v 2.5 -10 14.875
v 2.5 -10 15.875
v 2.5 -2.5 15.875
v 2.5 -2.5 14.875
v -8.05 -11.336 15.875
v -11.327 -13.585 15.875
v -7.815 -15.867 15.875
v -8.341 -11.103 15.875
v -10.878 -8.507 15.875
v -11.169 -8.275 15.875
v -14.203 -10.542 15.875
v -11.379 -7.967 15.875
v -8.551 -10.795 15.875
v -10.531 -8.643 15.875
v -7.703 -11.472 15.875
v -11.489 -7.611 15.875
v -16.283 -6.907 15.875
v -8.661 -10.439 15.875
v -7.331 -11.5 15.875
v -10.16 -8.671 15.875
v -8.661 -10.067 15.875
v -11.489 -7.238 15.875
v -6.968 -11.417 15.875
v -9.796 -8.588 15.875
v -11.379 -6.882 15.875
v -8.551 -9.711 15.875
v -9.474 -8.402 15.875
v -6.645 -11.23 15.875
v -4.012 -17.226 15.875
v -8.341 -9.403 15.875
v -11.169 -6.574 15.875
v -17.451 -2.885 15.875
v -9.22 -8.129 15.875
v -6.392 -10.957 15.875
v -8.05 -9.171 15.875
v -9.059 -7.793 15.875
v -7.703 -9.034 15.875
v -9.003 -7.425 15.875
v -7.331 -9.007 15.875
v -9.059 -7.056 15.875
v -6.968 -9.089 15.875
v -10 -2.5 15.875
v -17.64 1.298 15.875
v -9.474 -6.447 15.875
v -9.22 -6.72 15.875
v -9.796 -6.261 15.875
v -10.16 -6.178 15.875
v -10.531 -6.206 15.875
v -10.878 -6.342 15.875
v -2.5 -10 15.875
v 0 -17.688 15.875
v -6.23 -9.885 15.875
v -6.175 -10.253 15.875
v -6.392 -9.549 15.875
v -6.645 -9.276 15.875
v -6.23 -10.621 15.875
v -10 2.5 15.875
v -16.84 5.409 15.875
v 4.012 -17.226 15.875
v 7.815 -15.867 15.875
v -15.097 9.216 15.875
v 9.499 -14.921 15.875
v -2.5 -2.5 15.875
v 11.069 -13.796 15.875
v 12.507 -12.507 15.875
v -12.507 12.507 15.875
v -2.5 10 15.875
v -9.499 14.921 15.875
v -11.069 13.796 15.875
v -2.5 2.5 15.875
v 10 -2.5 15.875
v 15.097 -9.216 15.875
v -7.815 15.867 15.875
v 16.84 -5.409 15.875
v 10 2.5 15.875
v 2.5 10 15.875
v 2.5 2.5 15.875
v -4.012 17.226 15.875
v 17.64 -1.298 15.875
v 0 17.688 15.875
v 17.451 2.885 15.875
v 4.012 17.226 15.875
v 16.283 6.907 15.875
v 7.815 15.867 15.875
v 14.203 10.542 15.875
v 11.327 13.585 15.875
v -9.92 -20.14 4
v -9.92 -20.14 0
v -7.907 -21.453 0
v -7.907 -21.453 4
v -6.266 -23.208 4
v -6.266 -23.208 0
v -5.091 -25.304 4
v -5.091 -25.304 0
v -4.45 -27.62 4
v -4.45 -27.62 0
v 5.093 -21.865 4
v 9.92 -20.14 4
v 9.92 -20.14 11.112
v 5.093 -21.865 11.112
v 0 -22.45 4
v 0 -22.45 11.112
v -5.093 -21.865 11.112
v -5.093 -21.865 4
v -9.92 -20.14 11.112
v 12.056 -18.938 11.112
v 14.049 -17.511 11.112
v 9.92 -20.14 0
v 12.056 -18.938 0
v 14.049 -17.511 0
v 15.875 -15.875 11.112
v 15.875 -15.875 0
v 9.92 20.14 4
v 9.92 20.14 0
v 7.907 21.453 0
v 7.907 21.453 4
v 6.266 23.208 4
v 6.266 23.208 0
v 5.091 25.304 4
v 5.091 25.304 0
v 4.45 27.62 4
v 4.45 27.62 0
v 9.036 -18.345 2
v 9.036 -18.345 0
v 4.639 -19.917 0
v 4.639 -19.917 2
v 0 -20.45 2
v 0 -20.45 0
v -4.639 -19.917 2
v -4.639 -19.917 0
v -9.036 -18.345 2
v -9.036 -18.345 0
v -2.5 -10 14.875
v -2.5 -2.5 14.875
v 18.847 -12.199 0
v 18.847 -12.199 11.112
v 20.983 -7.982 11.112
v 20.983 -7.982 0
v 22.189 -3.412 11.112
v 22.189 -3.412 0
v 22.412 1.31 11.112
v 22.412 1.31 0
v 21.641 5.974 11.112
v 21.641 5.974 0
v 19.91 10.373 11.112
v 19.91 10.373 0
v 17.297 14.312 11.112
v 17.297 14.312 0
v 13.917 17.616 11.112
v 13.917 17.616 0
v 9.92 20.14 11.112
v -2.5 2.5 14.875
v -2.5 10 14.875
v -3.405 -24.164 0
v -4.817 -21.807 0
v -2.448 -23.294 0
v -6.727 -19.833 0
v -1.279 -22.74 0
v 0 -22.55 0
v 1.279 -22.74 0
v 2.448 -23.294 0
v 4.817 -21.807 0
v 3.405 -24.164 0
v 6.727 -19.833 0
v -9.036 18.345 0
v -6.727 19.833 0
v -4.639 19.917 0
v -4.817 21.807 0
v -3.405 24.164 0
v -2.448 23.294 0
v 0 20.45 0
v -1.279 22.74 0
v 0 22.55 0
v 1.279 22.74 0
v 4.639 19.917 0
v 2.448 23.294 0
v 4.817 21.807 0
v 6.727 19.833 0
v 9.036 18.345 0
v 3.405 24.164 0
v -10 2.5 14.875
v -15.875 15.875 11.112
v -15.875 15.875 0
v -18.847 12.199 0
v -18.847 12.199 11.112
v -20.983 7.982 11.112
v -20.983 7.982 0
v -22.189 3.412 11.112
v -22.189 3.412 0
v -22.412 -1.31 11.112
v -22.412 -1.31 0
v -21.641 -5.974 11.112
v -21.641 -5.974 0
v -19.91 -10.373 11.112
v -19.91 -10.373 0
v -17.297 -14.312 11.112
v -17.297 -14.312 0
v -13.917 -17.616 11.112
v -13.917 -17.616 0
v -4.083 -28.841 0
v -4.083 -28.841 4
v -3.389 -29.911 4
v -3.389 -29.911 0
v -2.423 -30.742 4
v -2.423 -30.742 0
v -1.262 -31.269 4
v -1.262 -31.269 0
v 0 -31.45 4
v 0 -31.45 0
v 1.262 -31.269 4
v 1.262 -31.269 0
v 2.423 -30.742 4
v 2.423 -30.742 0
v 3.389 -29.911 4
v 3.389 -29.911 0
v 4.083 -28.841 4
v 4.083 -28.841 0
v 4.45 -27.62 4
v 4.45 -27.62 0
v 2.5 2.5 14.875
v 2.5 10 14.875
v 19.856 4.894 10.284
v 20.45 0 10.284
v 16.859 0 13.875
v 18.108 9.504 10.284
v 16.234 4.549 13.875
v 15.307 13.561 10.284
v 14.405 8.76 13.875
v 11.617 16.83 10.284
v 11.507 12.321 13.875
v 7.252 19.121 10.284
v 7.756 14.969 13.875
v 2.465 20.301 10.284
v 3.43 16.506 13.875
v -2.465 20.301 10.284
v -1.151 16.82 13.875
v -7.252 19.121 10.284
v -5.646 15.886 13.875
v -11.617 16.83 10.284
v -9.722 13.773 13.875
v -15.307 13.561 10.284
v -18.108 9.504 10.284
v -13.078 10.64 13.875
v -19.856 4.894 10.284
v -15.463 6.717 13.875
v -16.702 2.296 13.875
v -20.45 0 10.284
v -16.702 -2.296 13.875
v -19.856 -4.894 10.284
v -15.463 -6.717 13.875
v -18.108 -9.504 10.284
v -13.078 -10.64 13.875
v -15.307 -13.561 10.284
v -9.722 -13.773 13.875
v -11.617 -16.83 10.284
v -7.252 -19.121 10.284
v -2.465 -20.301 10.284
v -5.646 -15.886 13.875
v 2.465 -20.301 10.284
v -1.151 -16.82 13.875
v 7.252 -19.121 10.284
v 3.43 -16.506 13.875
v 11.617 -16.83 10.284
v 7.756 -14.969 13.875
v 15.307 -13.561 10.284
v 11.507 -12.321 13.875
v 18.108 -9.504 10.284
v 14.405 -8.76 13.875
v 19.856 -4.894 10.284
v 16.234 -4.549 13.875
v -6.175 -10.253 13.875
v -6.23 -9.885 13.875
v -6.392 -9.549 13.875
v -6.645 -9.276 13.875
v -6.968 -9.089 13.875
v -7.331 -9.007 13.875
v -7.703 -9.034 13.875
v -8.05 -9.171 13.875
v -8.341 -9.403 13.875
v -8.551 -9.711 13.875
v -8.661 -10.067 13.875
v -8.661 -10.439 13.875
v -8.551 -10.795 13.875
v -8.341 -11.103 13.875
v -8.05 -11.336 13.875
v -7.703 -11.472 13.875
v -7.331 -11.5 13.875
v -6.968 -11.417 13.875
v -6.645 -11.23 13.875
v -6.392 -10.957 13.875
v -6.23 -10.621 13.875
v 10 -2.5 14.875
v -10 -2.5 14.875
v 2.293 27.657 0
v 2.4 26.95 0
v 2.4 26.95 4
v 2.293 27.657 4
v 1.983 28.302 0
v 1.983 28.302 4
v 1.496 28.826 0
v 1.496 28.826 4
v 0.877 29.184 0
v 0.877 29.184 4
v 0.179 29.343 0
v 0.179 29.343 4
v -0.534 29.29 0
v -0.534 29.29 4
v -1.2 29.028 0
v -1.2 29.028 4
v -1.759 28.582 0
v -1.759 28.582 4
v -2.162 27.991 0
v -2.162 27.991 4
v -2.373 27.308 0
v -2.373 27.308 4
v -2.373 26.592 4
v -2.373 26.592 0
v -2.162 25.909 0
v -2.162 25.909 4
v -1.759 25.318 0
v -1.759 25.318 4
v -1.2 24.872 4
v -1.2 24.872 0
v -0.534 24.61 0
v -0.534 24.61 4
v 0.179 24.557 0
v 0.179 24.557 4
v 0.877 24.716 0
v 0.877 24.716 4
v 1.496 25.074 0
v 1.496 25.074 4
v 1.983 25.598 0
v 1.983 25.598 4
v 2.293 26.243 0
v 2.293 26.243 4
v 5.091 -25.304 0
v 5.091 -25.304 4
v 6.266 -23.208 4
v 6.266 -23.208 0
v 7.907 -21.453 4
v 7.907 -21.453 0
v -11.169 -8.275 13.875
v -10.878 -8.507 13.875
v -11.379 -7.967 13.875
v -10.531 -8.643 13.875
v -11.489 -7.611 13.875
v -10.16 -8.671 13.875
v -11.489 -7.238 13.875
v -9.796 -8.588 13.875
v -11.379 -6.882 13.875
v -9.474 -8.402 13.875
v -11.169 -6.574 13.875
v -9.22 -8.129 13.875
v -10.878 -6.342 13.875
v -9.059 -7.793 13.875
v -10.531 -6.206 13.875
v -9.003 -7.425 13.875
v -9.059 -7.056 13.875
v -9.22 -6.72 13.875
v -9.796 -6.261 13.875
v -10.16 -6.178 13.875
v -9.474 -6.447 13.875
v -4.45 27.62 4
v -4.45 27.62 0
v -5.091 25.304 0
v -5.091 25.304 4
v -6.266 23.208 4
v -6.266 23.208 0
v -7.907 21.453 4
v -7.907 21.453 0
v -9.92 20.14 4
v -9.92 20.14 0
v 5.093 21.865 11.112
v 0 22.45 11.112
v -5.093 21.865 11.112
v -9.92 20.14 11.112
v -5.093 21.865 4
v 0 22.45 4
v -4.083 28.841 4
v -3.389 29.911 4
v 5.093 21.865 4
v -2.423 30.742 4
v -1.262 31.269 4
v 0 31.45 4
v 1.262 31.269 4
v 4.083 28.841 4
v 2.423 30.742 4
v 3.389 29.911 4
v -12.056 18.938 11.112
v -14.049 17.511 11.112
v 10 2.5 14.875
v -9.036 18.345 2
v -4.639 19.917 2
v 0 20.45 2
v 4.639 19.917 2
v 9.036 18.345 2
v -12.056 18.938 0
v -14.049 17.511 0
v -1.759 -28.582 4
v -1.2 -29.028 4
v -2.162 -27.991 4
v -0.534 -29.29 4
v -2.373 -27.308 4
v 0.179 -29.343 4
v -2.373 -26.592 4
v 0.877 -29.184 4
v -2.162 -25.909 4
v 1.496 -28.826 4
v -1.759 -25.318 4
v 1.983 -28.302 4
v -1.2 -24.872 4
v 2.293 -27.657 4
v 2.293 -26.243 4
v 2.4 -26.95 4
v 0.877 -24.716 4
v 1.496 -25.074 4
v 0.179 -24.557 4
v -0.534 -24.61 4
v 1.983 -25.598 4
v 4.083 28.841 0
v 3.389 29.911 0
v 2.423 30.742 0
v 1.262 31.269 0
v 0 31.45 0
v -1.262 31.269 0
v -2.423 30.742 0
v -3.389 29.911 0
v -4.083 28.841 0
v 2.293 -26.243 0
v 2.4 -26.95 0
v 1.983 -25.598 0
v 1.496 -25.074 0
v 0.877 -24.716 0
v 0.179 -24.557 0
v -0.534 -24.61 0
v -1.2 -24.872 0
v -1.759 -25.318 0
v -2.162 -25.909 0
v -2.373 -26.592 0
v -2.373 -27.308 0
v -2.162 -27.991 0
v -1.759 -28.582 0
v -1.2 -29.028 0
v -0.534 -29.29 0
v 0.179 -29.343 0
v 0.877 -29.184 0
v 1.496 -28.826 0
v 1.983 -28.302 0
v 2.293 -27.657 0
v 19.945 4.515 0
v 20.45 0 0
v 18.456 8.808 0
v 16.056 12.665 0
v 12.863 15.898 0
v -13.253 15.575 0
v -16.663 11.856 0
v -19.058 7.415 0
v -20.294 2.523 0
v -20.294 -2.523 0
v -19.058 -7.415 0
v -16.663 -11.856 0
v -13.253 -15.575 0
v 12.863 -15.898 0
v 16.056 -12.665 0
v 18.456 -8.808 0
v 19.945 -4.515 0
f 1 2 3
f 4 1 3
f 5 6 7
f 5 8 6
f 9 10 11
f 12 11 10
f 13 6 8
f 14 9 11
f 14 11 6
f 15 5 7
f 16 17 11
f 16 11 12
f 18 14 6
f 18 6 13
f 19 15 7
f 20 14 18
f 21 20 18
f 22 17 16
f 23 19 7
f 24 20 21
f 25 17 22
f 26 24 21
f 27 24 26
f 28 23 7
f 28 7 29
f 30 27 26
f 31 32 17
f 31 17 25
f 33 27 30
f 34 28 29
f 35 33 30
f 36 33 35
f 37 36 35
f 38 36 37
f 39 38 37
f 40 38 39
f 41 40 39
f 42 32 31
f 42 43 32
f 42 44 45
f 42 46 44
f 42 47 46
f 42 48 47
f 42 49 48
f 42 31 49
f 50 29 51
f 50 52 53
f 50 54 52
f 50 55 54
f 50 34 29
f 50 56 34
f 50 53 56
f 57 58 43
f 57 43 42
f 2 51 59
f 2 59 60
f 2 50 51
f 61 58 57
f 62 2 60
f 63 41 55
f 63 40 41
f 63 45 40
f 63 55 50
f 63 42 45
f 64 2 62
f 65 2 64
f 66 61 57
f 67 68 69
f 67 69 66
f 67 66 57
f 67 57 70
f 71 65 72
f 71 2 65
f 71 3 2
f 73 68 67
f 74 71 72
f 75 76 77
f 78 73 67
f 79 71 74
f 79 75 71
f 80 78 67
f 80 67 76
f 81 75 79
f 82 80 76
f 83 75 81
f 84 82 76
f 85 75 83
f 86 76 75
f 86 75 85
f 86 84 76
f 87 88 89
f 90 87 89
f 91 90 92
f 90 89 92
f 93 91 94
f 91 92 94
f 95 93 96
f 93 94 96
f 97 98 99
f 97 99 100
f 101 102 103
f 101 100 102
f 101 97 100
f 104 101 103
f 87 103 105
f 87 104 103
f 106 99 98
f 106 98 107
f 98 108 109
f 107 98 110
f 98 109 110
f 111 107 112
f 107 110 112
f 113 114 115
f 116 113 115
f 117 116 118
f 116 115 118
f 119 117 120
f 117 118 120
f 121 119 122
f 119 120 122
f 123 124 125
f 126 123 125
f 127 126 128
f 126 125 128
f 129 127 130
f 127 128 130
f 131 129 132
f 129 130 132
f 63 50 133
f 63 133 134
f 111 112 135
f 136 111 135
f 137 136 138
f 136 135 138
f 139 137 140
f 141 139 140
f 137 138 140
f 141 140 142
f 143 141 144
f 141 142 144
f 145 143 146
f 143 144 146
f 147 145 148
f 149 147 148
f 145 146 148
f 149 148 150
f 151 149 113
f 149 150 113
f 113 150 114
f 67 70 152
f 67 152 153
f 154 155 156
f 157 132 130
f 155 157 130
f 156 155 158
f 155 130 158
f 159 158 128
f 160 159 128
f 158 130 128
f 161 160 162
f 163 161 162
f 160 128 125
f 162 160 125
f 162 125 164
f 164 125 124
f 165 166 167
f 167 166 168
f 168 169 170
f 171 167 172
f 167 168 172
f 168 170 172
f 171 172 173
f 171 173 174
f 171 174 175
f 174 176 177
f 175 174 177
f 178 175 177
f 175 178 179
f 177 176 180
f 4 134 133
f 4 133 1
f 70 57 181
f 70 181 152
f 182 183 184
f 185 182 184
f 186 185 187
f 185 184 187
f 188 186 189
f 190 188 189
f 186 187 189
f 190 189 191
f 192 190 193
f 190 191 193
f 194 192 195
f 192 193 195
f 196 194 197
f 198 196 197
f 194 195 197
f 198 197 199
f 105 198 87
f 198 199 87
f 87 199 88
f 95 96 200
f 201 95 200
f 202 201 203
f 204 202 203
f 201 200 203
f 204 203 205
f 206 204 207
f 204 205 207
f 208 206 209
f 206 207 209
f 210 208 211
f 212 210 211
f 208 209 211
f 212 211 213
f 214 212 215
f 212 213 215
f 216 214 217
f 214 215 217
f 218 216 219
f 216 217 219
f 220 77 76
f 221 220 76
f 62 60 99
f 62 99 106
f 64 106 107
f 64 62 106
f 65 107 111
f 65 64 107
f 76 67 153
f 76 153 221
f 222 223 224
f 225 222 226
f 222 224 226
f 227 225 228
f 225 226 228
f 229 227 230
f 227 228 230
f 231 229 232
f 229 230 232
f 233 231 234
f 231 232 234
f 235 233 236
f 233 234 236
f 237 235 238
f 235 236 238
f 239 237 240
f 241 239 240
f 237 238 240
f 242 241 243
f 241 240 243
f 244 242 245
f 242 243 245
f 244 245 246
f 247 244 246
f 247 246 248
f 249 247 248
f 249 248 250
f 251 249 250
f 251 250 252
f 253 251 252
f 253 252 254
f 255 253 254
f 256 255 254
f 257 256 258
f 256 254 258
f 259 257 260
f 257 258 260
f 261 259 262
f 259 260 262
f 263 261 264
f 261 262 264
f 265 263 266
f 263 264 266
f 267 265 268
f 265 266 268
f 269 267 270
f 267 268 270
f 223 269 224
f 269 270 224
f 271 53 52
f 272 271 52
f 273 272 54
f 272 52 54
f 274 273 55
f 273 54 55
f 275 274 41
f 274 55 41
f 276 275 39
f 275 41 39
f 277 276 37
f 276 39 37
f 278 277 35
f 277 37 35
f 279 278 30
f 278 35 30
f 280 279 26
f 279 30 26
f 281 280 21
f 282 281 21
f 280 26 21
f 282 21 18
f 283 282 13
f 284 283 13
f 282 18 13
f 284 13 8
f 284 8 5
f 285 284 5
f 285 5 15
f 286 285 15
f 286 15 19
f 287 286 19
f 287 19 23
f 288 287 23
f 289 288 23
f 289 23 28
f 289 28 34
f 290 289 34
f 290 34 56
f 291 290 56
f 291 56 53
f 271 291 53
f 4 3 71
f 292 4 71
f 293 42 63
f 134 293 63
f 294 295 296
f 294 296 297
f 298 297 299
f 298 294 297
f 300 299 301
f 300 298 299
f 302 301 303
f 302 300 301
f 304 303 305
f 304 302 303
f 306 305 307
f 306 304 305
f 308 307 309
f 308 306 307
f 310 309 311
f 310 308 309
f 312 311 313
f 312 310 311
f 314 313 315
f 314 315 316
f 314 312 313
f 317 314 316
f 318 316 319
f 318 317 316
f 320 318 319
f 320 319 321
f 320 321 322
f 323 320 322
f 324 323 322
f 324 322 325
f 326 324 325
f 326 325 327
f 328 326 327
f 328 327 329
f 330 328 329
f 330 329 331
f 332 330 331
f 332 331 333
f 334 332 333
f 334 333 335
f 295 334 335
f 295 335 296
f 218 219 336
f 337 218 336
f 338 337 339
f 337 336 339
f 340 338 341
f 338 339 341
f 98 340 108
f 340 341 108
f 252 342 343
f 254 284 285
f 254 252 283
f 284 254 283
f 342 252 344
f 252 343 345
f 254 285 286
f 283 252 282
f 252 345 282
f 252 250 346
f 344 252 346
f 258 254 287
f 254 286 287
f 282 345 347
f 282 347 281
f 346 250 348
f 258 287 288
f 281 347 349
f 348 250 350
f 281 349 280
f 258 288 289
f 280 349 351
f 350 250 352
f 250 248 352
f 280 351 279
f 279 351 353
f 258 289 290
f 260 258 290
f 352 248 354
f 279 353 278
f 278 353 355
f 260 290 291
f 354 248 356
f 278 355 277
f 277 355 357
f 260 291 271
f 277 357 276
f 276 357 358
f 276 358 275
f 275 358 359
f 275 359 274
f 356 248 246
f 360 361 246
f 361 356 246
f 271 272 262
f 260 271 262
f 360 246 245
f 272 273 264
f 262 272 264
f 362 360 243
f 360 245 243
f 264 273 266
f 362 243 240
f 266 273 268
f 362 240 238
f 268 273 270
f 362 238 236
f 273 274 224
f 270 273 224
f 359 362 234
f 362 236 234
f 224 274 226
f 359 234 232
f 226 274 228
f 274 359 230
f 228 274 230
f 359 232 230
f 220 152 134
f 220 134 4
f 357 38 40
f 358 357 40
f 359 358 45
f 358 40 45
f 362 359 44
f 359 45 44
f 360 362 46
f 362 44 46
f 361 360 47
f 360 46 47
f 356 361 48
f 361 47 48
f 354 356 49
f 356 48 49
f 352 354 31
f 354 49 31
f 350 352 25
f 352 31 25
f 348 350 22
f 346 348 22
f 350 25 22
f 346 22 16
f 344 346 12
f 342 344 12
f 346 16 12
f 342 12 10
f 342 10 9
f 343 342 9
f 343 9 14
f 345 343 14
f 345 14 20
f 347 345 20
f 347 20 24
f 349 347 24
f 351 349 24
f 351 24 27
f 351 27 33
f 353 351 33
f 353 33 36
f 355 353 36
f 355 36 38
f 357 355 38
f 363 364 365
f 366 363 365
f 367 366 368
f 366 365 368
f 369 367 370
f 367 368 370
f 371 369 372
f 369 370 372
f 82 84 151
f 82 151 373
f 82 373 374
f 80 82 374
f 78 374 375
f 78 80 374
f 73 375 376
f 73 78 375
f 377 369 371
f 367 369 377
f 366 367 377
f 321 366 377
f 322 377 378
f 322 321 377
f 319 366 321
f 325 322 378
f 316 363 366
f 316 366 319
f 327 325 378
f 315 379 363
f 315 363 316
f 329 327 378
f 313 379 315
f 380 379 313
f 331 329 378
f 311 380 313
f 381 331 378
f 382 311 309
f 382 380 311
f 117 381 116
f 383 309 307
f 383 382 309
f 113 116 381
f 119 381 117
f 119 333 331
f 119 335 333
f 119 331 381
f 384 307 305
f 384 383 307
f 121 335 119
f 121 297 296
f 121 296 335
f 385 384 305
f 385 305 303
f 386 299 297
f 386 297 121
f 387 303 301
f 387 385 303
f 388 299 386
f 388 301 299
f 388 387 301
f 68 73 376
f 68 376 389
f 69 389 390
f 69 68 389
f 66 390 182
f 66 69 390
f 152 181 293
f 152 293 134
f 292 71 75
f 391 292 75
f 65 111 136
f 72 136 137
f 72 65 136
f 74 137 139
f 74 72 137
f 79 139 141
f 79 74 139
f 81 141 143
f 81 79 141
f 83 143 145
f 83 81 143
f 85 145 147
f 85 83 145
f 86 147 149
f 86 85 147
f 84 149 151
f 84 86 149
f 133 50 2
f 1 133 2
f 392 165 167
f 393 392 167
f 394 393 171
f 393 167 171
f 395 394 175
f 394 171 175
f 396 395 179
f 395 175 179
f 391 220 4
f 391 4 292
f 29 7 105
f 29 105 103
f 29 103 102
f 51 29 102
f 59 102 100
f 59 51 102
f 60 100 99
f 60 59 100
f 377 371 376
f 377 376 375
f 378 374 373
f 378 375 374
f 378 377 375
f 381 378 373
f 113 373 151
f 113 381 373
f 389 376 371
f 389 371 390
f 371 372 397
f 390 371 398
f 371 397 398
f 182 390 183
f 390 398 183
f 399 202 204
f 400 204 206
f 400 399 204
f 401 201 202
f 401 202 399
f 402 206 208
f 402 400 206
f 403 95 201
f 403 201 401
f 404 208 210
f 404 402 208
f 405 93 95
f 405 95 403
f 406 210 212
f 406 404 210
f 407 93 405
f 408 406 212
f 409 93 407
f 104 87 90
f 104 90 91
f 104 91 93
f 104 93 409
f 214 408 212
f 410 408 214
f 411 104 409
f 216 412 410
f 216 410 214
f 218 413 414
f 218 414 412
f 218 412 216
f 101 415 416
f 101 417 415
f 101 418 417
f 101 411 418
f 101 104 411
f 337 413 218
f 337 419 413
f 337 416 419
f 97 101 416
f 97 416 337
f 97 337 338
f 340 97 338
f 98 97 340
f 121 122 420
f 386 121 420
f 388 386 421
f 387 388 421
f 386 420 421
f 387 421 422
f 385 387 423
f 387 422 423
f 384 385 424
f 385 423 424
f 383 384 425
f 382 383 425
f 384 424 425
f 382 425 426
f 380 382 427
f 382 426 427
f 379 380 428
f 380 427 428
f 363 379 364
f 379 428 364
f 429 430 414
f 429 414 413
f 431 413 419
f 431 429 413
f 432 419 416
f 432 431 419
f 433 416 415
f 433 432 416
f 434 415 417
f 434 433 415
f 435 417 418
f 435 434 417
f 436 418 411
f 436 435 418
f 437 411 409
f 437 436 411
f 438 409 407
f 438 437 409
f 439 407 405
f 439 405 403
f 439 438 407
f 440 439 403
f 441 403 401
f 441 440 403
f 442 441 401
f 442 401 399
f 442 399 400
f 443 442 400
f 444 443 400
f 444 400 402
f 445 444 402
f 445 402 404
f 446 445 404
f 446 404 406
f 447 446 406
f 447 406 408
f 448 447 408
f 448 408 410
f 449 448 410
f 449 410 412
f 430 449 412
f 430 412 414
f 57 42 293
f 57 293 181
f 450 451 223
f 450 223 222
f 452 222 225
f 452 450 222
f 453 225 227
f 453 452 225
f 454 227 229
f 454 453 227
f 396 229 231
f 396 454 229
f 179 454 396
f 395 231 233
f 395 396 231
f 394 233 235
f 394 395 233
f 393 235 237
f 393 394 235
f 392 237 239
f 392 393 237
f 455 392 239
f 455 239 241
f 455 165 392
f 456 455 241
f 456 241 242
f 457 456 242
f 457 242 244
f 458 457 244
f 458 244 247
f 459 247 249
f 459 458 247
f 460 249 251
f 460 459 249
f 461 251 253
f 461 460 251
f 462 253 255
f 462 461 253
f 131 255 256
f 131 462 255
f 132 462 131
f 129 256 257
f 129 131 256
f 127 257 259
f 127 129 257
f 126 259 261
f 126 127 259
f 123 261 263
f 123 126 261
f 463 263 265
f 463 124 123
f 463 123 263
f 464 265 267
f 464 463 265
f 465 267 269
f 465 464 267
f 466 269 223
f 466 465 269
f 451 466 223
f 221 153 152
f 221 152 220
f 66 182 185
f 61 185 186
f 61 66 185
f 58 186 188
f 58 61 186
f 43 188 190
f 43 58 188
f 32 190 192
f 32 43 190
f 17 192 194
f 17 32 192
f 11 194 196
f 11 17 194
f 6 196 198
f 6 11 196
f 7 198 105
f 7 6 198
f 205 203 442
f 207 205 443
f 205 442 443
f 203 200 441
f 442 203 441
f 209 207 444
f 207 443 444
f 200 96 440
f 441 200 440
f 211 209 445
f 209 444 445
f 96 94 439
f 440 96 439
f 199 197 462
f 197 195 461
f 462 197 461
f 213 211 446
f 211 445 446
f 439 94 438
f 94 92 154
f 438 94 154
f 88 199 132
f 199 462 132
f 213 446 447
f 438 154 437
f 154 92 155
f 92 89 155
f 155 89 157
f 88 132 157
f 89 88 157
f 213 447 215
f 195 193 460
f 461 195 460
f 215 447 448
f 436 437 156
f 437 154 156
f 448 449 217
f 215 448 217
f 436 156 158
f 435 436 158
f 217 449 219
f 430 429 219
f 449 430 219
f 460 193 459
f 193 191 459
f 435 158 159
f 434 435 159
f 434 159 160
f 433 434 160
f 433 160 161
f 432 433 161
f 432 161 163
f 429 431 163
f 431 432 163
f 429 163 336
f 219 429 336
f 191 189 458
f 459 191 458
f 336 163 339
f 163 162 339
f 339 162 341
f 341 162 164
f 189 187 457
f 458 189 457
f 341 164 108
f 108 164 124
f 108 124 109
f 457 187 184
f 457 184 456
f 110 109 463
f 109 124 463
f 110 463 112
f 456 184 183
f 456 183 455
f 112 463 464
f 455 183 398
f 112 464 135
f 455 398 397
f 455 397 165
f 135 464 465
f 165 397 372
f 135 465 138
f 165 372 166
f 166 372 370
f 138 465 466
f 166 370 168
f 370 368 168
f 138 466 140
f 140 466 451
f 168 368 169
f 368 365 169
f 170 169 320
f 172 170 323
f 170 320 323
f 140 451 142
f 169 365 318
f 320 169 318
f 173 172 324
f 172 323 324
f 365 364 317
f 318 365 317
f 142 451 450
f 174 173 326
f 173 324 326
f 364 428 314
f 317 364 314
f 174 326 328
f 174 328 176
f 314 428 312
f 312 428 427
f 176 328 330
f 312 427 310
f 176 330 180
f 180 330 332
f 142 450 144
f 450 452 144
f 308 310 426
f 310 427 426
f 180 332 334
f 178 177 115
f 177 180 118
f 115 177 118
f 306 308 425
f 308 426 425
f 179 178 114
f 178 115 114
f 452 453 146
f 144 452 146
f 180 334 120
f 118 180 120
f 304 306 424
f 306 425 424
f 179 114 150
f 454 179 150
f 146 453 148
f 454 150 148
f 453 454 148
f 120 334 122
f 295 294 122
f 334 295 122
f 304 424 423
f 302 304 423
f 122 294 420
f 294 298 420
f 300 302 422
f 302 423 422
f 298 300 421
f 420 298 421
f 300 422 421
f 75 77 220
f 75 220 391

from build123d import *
from build123d.topology import SkipClean

# Parameters (mm, degrees)
SKETCH1_R           = 2.4
BOSS_EXTRUDE1_DEPTH = 15.875
CUT_EXTRUDE11_START = -11.875
SKETCH13_R          = 2.4
CUT_EXTRUDE11_DEPTH = 11.875
CHAMFER1_SIZE       = 4.7625
SHELL1_OUTLINE_R    = 20.45
SHELL1_DEPTH        = 10.284072775
SHELL1_2_DEPTH      = 2
BOSS_EXTRUDE2_START = 2
BOSS_EXTRUDE2_DEPTH = 2
SKETCH15_W          = 7.5
SKETCH15_H          = 5
SKETCH15_W_2        = 5
SKETCH15_H_2        = 7.5
CUT_EXTRUDE12_DEPTH = 1
SKETCH16_R          = 1.25
CUT_EXTRUDE13_DEPTH = 42.774640932


with BuildPart() as part:
    # Sketch1 → Boss-Extrude1 (new body)
    # profile 1 of 3: a face of its own
    with BuildSketch(Plane.XY):
        with BuildLine():
            ThreePointArc((9.919608253, -20.139609532), (13.072195817, -18.251580659), (15.874547238, -15.874547238))
            Line((15.874547238, -15.874547238), (14.460333675, -14.460333675))
            ThreePointArc((14.460333675, -14.460333675), (-14.460333675, -14.460333675), (-14.460333675, 14.460333675))
            Line((-14.460333675, 14.460333675), (-15.874547238, 15.874547238))
            ThreePointArc((-15.874547238, 15.874547238), (-22.149254758, -3.662378144), (-9.919608253, -20.139609532))
            ThreePointArc((-9.919608253, -20.139609532), (-6.265793461, -23.208178662), (-4.449768206, -27.62049453))
            ThreePointArc((-4.449768206, -27.62049453), (0, -31.45), (4.449768206, -27.62049453))
            ThreePointArc((4.449768206, -27.62049453), (6.265793461, -23.208178662), (9.919608253, -20.139609532))
        make_face()
        with Locations((0, -26.95)):
            Circle(SKETCH1_R, mode=Mode.SUBTRACT)
    # profile 2 of 3: a face of its own
    with BuildSketch(Plane.XY):
        with BuildLine():
            Line((14.460333675, -14.460333675), (15.874547238, -15.874547238))
            ThreePointArc((15.874547238, -15.874547238), (22.149254758, 3.662378144), (9.919608253, 20.139609532))
            ThreePointArc((9.919608253, 20.139609532), (6.265793461, 23.208178662), (4.449768206, 27.62049453))
            ThreePointArc((4.449768206, 27.62049453), (0, 31.45), (-4.449768206, 27.62049453))
            ThreePointArc((-4.449768206, 27.62049453), (-6.265793461, 23.208178662), (-9.919608253, 20.139609532))
            ThreePointArc((-9.919608253, 20.139609532), (-13.072195817, 18.251580659), (-15.874547238, 15.874547238))
            Line((-15.874547238, 15.874547238), (-14.460333675, 14.460333675))
            ThreePointArc((-14.460333675, 14.460333675), (14.460333675, 14.460333675), (14.460333675, -14.460333675))
        make_face()
        with Locations((0, 26.95)):
            Circle(SKETCH1_R, mode=Mode.SUBTRACT)
    # profile 3 of 3: a face of its own
    with BuildSketch(Plane.XY):
        with BuildLine():
            ThreePointArc((-14.460333675, 14.460333675), (-14.460333675, -14.460333675), (14.460333675, -14.460333675))
            ThreePointArc((14.460333675, -14.460333675), (14.460333675, 14.460333675), (-14.460333675, 14.460333675))
        make_face()
    extrude(amount=BOSS_EXTRUDE1_DEPTH)

    # Sketch13 → Cut-Extrude11 (cut)
    # profile 1 of 2: a face of its own
    with SkipClean():  # the faces are left unmerged after this step: merging them gives an invalid solid
        with BuildSketch(Plane.XY.offset(15.875).offset(CUT_EXTRUDE11_START)):
            with BuildLine():
                ThreePointArc((4.449768206, -27.62049453), (6.265793461, -23.208178662), (9.919608253, -20.139609532))
                ThreePointArc((9.919608253, -20.139609532), (0, -22.45), (-9.919608253, -20.139609532))
                ThreePointArc((-9.919608253, -20.139609532), (-6.265793461, -23.208178662), (-4.449768206, -27.62049453))
                ThreePointArc((-4.449768206, -27.62049453), (0, -31.45), (4.449768206, -27.62049453))
            make_face()
            with Locations((0, -26.95)):
                Circle(SKETCH13_R, mode=Mode.SUBTRACT)
        # profile 2 of 2: a face of its own
        with BuildSketch(Plane.XY.offset(15.875).offset(CUT_EXTRUDE11_START)):
            with BuildLine():
                ThreePointArc((-9.919608253, 20.139609532), (0, 22.45), (9.919608253, 20.139609532))
                ThreePointArc((9.919608253, 20.139609532), (6.265793461, 23.208178662), (4.449768206, 27.62049453))
                ThreePointArc((4.449768206, 27.62049453), (0, 31.45), (-4.449768206, 27.62049453))
                ThreePointArc((-4.449768206, 27.62049453), (-6.265793461, 23.208178662), (-9.919608253, 20.139609532))
            make_face()
            with Locations((0, 26.95)):
                Circle(SKETCH13_R, mode=Mode.SUBTRACT)
        extrude(amount=CUT_EXTRUDE11_DEPTH, mode=Mode.SUBTRACT)

    # Chamfer1
    chamfer1_edges = [part.edges().sort_by_distance(p)[0] for p in [
        (22.45, 0, 15.875),
    ]]
    chamfer(chamfer1_edges, length=CHAMFER1_SIZE)

    # Shell1: read off the stored shape, not the designer's step
    # Shell1 outline → Shell1 (cut)
    with SkipClean():  # the faces are left unmerged after this step: merging them gives an invalid solid
        with BuildSketch(Plane.XY):
            Circle(SHELL1_OUTLINE_R)
        extrude(amount=SHELL1_DEPTH, mode=Mode.SUBTRACT)

    # Shell1 2 outline → Shell1 2 (cut)
    with SkipClean():  # the faces are left unmerged after this step: merging them gives an invalid solid
        with BuildSketch(Plane.XY):
            with BuildLine():
                ThreePointArc((-3.405256243, -24.163563222), (0, -22.55), (3.405256243, -24.163563222))
                ThreePointArc((3.405256243, -24.163563222), (5.715063361, -20.765273279), (9.035901505, -18.345434963))
                ThreePointArc((9.035901505, -18.345434963), (0, -20.45), (-9.035901505, -18.345434963))
                ThreePointArc((-9.035901505, -18.345434963), (-5.715063361, -20.765273279), (-3.405256243, -24.163563222))
            make_face()
            with BuildLine():
                ThreePointArc((-3.405256243, 24.163563222), (-5.715063361, 20.765273279), (-9.035901505, 18.345434963))
                ThreePointArc((-9.035901505, 18.345434963), (0, 20.45), (9.035901505, 18.345434963))
                ThreePointArc((9.035901505, 18.345434963), (5.715063361, 20.765273279), (3.405256243, 24.163563222))
                ThreePointArc((3.405256243, 24.163563222), (0, 22.55), (-3.405256243, 24.163563222))
            make_face()
        extrude(amount=SHELL1_2_DEPTH, mode=Mode.SUBTRACT)

    # Shell1 3 outline → Shell1 3 (revolve, cut)
    with SkipClean():  # the faces are left unmerged after this step: merging them gives an invalid solid
        with BuildSketch(Plane.XZ):
            Polygon((16.859072875, 13.875), (0, 13.875), (0, 10.284072775), (20.45, 10.284072775), align=None)
        revolve(axis=Axis((0, 0, 0), (0, 0, 1)), mode=Mode.SUBTRACT)

    # Sketch14 → Boss-Extrude2 (add)
    with SkipClean():  # the faces are left unmerged after this step: merging them gives an invalid solid
        with BuildSketch(Plane(origin=(0, 0, 2), x_dir=(-1, 0, 0), z_dir=(0, 0, -1)).offset(BOSS_EXTRUDE2_START)):
            with BuildLine():
                ThreePointArc((-9.035901505, 18.345434963), (-5.715063361, 20.765273279), (-3.405256243, 24.163563222))
                ThreePointArc((-3.405256243, 24.163563222), (0, 22.55), (3.405256243, 24.163563222))
                ThreePointArc((3.405256243, 24.163563222), (5.715063361, 20.765273279), (9.035901505, 18.345434963))
                ThreePointArc((9.035901505, 18.345434963), (0, 20.45), (-9.035901505, 18.345434963))
            make_face()
            with BuildLine():
                ThreePointArc((9.035901505, -18.345434963), (5.715063361, -20.765273279), (3.405256243, -24.163563222))
                ThreePointArc((3.405256243, -24.163563222), (0, -22.55), (-3.405256243, -24.163563222))
                ThreePointArc((-3.405256243, -24.163563222), (-5.715063361, -20.765273279), (-9.035901505, -18.345434963))
                ThreePointArc((-9.035901505, -18.345434963), (0, -20.45), (9.035901505, -18.345434963))
            make_face()
        extrude(amount=-BOSS_EXTRUDE2_DEPTH)

    # Sketch15 → Cut-Extrude12 (cut)
    with SkipClean():  # the faces are left unmerged after this step: merging them gives an invalid solid
        with BuildSketch(Plane.XY.offset(15.875)):
            with Locations((-6.25, 0)):
                Rectangle(SKETCH15_W, SKETCH15_H)
            Rectangle(SKETCH15_W_2, SKETCH15_H)
            with Locations((6.25, 0)):
                Rectangle(SKETCH15_W, SKETCH15_H)
            with Locations((0, -6.25)):
                Rectangle(SKETCH15_W_2, SKETCH15_H_2)
            with Locations((0, 6.25)):
                Rectangle(SKETCH15_W_2, SKETCH15_H_2)
        extrude(amount=-CUT_EXTRUDE12_DEPTH, mode=Mode.SUBTRACT)

    # Sketch16 → Cut-Extrude13 (cut, through all)
    with SkipClean():  # the faces are left unmerged after this step: merging them gives an invalid solid
        with BuildSketch(Plane.XY.offset(15.875)):
            with Locations((-7.424621202, -10.253048327)):
                Circle(SKETCH16_R)
            with Locations((-10.253048327, -7.424621202)):
                Circle(SKETCH16_R)
        extrude(amount=-CUT_EXTRUDE13_DEPTH, mode=Mode.SUBTRACT)


solid = part.part
